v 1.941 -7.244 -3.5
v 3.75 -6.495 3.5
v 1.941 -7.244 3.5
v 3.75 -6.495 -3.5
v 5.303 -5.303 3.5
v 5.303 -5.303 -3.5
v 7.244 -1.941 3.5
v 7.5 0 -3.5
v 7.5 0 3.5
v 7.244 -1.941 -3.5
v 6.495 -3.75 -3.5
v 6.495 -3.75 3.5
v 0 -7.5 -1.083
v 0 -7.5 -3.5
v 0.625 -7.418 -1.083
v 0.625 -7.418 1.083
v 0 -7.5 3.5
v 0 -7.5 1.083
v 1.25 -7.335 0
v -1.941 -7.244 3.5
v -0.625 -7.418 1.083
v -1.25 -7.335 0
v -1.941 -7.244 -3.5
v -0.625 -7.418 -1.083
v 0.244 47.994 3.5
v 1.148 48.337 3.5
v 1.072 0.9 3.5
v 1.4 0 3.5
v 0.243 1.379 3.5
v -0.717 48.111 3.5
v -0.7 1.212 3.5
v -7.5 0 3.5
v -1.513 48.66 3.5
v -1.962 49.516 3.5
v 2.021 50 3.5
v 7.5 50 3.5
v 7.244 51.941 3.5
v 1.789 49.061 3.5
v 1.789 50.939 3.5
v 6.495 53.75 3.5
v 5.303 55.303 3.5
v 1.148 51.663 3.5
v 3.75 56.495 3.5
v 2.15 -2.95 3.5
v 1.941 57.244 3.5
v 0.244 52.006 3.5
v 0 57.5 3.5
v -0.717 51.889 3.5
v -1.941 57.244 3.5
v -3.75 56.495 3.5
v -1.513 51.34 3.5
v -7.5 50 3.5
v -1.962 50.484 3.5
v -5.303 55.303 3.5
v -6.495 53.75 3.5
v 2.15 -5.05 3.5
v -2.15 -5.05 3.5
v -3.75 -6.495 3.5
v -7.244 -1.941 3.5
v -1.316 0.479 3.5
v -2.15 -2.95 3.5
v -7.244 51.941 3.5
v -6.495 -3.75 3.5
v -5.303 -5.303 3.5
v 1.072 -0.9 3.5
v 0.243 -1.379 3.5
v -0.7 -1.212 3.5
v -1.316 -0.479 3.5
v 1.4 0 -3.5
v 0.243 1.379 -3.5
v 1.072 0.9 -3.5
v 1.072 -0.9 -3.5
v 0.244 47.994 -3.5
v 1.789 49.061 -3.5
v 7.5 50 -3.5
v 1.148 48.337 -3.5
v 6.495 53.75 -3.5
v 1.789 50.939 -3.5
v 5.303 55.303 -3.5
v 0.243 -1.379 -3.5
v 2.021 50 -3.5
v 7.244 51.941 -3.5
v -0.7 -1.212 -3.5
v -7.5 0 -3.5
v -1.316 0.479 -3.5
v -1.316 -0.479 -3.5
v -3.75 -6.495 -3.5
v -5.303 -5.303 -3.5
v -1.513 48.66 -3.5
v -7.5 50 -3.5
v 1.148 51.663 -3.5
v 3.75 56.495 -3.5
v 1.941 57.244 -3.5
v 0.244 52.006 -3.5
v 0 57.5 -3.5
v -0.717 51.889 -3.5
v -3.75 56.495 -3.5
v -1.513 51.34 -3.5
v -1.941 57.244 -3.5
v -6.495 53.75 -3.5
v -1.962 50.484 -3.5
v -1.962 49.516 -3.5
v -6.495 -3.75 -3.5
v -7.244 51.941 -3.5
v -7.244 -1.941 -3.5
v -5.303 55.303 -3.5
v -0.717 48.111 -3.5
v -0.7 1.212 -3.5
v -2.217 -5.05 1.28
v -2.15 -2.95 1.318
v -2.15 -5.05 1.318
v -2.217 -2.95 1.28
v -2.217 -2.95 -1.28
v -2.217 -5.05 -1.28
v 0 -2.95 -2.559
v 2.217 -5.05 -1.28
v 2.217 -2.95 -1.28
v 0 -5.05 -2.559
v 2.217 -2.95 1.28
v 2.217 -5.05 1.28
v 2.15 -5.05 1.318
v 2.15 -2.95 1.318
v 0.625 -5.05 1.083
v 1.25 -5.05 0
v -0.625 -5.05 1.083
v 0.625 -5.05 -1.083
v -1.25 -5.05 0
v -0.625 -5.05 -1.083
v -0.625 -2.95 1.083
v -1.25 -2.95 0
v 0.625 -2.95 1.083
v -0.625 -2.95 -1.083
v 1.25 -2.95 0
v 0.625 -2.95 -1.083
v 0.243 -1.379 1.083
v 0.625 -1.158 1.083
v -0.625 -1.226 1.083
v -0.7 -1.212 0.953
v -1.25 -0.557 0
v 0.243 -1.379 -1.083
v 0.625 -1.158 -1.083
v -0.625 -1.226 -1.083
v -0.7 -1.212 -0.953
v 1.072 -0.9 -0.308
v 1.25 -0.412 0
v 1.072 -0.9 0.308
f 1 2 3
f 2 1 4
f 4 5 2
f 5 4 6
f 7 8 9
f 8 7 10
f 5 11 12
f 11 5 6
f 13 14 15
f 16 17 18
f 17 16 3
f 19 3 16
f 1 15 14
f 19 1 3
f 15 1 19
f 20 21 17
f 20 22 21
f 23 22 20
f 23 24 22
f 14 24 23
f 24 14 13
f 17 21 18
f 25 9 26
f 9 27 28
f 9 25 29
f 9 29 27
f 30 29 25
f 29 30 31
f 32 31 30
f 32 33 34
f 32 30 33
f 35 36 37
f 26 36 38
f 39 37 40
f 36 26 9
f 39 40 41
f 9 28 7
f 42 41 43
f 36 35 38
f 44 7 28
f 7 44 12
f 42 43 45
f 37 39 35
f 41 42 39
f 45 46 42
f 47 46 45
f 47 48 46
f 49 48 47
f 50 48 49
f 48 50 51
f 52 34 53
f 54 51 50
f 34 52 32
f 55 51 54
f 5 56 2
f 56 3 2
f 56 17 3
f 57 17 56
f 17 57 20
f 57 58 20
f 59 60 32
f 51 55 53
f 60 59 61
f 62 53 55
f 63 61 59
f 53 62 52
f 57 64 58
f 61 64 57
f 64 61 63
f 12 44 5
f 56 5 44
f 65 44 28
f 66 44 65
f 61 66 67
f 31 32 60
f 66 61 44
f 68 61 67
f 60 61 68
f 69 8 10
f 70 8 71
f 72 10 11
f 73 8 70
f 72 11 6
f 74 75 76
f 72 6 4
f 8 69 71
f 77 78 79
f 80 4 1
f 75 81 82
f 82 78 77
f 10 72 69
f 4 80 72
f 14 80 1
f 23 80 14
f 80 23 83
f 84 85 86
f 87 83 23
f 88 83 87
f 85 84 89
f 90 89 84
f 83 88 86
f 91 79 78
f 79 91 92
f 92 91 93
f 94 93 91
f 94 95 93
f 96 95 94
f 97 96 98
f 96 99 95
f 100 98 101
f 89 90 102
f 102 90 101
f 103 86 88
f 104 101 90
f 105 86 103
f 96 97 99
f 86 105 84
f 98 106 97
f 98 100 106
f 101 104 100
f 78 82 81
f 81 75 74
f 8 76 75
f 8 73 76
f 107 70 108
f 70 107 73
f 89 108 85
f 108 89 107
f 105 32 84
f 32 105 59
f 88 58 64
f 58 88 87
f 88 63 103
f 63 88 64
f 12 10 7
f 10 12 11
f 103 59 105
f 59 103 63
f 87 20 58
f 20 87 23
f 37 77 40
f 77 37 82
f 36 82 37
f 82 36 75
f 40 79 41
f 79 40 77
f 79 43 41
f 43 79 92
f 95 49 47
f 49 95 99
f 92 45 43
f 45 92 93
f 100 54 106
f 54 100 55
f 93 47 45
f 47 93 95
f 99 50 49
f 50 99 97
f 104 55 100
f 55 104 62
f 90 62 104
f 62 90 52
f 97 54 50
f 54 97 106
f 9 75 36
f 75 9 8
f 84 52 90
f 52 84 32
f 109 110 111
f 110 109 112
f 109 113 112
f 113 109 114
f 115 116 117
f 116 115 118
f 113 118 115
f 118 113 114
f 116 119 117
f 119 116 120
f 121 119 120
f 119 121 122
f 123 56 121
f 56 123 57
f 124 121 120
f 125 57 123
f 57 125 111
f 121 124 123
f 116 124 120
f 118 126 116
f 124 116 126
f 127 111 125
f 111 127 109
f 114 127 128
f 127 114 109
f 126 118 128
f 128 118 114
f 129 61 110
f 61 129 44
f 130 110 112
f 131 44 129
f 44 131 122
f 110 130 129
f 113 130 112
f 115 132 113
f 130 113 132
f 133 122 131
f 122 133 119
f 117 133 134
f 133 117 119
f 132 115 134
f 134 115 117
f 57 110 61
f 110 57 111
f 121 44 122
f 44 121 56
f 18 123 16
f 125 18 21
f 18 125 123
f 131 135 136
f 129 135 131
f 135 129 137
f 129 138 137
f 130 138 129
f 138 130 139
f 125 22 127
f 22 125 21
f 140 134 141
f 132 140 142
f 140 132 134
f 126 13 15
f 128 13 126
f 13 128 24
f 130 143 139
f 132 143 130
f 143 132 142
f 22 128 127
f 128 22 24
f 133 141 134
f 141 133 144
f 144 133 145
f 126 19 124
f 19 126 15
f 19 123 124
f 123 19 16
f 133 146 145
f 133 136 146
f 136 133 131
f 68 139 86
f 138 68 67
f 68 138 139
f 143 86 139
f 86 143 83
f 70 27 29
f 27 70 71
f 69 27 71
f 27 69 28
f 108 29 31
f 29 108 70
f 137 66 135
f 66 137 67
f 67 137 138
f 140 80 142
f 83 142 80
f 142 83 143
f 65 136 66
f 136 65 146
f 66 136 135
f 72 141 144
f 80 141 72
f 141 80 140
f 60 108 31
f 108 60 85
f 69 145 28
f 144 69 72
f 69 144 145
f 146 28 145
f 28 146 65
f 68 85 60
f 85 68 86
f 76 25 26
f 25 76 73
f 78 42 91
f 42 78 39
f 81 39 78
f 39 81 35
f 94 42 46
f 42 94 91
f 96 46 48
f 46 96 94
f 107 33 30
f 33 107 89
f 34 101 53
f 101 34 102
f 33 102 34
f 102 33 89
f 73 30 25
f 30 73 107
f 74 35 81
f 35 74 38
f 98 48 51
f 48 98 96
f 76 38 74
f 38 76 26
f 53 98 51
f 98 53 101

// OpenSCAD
// file: common.scad
//include <RatsoShapeLibrary.scad>



/*
Define settings for each nut/bolt type here
*/

// ### layer height of the printer ###
printer_layer_height = 0.4;

// kludge factor for different print nozzles
printer_oversize = 0.5; // 0.35 nozzle use 0.3; 0.6 nozzle use 0.?
printer_oversizeArc = 0.2; // 0.35 nozzle = ???; 0.6 nozzle = 0.2


// ### M3 ###

M3_boltDiameter = 3.0 + printer_oversize; // actual 3.0
M3_boltDiameterArc = 3.0 + printer_oversizeArc; // used for rotary extruded bolt channel
M3_boltHeadDiameter = 6.0 + printer_oversize; // actual 6
M3_nutHeight = 2.4 + printer_oversize; // actual 2.4
M3_lockNutHeight = 4.0 + printer_oversize; // actual 4.0
M3_nutDiameterMin = 5.5 + printer_oversize; // actual 5.5
M3_nutDiameterMax = (5.5*(1/sin(60))) + printer_oversize; // actual 6
M3_nutDiameterArc = 5.5; // used for rotary extruded nut channel

// eventually standardize this interface??, that would allow for easy switching of bolt/nut sizes
M3_dim = [M3_boltDiameter,M3_nutDiameterMin,M3_nutDiameterMax,M3_nutHeight];


// ### M2 ###

M2_boltDiameter = 2.0 + printer_oversize; // actual 2.0
M2_boltHeadDiameter = 4.0 + printer_oversize; // actual 4
M2_nutHeight = 1.6 + printer_oversize; // actual 1.6
M2_nutDiameterMin = 3.8 + printer_oversize; // actual 4
M2_nutDiameterMax = (4.0*(1/sin(60))) + printer_oversize; // actual 4.5

// eventually standardize this interface??, that would allow for easy switching of bolt/nut sizes
M2_dim = [M2_boltDiameter,M2_nutDiameterMin,M2_nutDiameterMax,M2_nutHeight];

// ### M8 ###
M8_rodDiameter = 8 + printer_oversize;

// ### PI ###
pi = 3.14159265359;



// ### shaft sizes for tight fit ###
woodDowel_quarterInch_diameter = 7.1;
woodDowel_halfInch_diameter = 13.5;
stepperMotor_diameter = 5.0 + printer_oversize; // actual 5.0



//--------




// =========================================================

//trapNutDie(channelHeight=20, holeLength=50, holeOffset=15 );
//trapNutDie(channelHeight=0 ,holeLength=15, holeOffset=0, nutOffset=0 );
// ** this is a brand-new function
module trapNutDie(
	channelHeight=15, 
	holeLength=10, 
	holeOffset=0, 
	nutOffset=0, 
	boltHoleRes=12,
	boltRadius = M3_boltDiameter/2, // DEPRICATE
	mType = 0,
	boltDiameter = M3_boltDiameter,
	nutHeight = M3_nutHeight,
	nutDiameterMin = M3_nutDiameterMin,
	nutDiameterMax = M3_nutDiameterMax,
	horizontal = false // should add a support to the bolt hole, AND (###TODO###) make the nut height a little higher
	){

	if(!horizontal){
		// hex-hole for the nut
		translate([0,-(nutHeight/2),-nutOffset]) rotate([-90,30,0]) cylinder(r=nutDiameterMax/2, h=nutHeight, $fn=6);
		// channel the nut drops into
		translate([-nutDiameterMin/2,-(nutHeight/2),0]) cube([nutDiameterMin,nutHeight,channelHeight]);
	}else{
		// hex-hole for the nut
		translate([0,-(nutHeight/2),-nutOffset]) rotate([-90,30,0]) cylinder(r=nutDiameterMax/2, h=nutHeight+printer_layer_height, $fn=6);
		// channel the nut drops into
		translate([-nutDiameterMin/2,-(nutHeight/2),0]) cube([nutDiameterMin,nutHeight+printer_layer_height,channelHeight]);
	}

	difference(){
		// bolt hole
		translate([0,-(holeLength/2)+holeOffset,0]) rotate([-90,0,0]) cylinder(r=boltDiameter/2, h=holeLength, $fn=boltHoleRes);
		if(horizontal){
			// cutout slice for support (if horizontal)
			rotate([-90,0,0]) translate([0,0,(nutHeight/2)+0.001]) cylinder(r=(boltDiameter/2)+1, h=printer_layer_height*2);
		}
	}
	
}

// =================================

//stumpWithTrapNut(shaftDiameter=stepperMotor_diameter, stumpWallThick=6, nutBlockThick=12);
//stumpWithTrapNut(shaftDiameter=16 + printer_oversize ); // shaft collar for Chad's drum stand
//stumpWithTrapNut(shaftDiameter=woodDowel_halfInch_diameter, stumpWallThick=8, nutBlockThick=0);
//stumpWithTrapNut(shaftDiameter=woodDowel_quarterInch_diameter); // shaftDiameter was 7.3, but a little too loose


module stumpWithTrapNut(
	shaftDiameter = 7.3,
	stumpWallThick = 4,
	nutBlockThick = 8,
	){

	shaftRadius = shaftDiameter/2;
	stumpRadius = shaftRadius + stumpWallThick;
	stumpHeight = 10;

	nutBlockWidth = M3_nutDiameterMax+stumpWallThick;
	nutBlockOffsetY = stumpRadius + nutBlockThick - stumpWallThick;
	stumpTrapNutOffsetY = shaftRadius + ( max( stumpWallThick, nutBlockThick ) / 2.5 );  //nutBlockOffsetY - (nutBlockThick/2); //
	stumpTrapNutOffsetZ = stumpHeight/2;

	trapNutBoltHoleLength = max( nutBlockThick, stumpWallThick );

		// nut stump
			translate([0,0,0]) difference(){
				union(){
					// stump
					translate([0,0,0]) cylinder(r=stumpRadius, h=stumpHeight, center=false);
					// nut block
					translate([-nutBlockWidth/2,-nutBlockOffsetY,0]) cube([nutBlockWidth,nutBlockThick,stumpHeight]);
				}
				// motor shaft
				translate([0,0,(stumpHeight)/2]) cylinder(r=shaftRadius, h=stumpHeight+1, center=true, $fn=shaftDiameter*3);
				// trap nut
				rotate([0,0,0]) translate([0,-stumpTrapNutOffsetY, stumpHeight-stumpTrapNutOffsetZ]) rotate([0,0,0]) trapNutDie(channelHeight=10 ,holeLength=trapNutBoltHoleLength*2, holeOffset=(-trapNutBoltHoleLength)/2 ); //holeOffset=(length/2)+(r1/2)
			} // translate difference
}
// main file
include<common.scad>
include <RatsoShapeLibrary.scad>


// ========================================================

// Main function calls. Build things here.


// the basic body, for both types
//buzzBotBody();
//buzzBotBodyNoBattery();
//buzzBotBody_clipHackCover();

// parts for BuzzBot mini
// DELETE - buzzBotMiniLeg();
//simpleLeg( [5,50,3], 7); // default for BuzzBot mini
//simpleLeg( [8,100,8], 8); // default for BuzzBot big

// ** change these NOT just mini **
//buzzBotMiniWireBlockFoot();
//buzzBotMiniWireBlockFoot(wireType="bristle", buzzBotLegsThick = 8 );
//buzzBotMiniShaftWeight();

// parts for BuzzBot big
//buzzBotBigShaftWeight(length=50);
//buzzBotBigShaftWeight(length=100);
buzzBotBigShaftWeight(length=50);



// these simple elements are called by the other main types

//rotate([0,30,0]) trapNutDie(channelHeight=0 ,holeLength=20, holeOffset=0, nutOffset=0 );
//batteryHolderCase();
//simpleMotorCase();
//wireLockBlock();
//wireLockBlock(wireType="bristle");
//switchCase();


// connector for dowels
//rodClamp()


// ========================================================



// body wall thickness gets used in a bunch of calculations below
bodyWallThick = 1.5;
bodyFloorThick = bodyWallThick*2;

// -------------------------------------
// Battery settings

// these first three need to change depending on battery type
batteryDiameter = 15; // AAA:actual 10.5,use 11, AA: actual 14.5, use 15
batteryLength = 50.5; // AAA: actual 44.5, AA=50.5;  
batteryTerminalWidth = 11; // AAA=9, AA=11; width and height same

// this is for using one of the manufactured battery holders
batteryHolder_AA_1X = [ 17, 57 ];
batteryHolder_AA_2X = [ 31.9, 56.8 ];
batteryHolder_AA_4X = [ 63.5, 58 ];
batteryHolderSize = batteryHolder_AA_2X; // 1x=[ 17, 57 ], 2x=[ 31.9, 56.8 ], 4x=[ 63.5, 58 ]different than the 1x, why?

batteryHolderBoltInset_AA_1X = [ 2.5, 5 ];
batteryHolderBoltInset_AA_2X = [ 13.5, 5.5 ];
batteryHolderBoltInset_AA_4X = [ 3, 29 ];
batteryHolderBoltInset = batteryHolderBoltInset_AA_2X; // 1x=[2.5,5], 4x=[3,center]

batteryHolderWallHeight = 3;

// these stay the same 
batteryTerminalThick = 1.0; // was 1.6, thickness including bent tab, same for AAA/AA
batteryTerminalTabWidth = 3.5; // was 3.5
batteryTerminalTabThick = 1.5; // was 1.6
batteryTerminalTabRatio = 0.3; // where the triangle split occurs
batteryTerminalOpeningWidth = 9; // AAA  7; AA 9
batteryTerminalSlopeMaxWidth = (batteryTerminalWidth+batteryDiameter)/2; // max width of the area  where the terminals begin to slope

// calculate the size of the battery case
batteryCaseSizeOuter = [ 
	batteryHolderSize[0]+(bodyWallThick*2), 
	bodyWallThick+batteryHolderSize[1]+bodyWallThick, 
	batteryHolderWallHeight+bodyFloorThick
];
// the cutout for the battery
batteryCutoutSize = [ 
	batteryHolderSize[0], 
	batteryHolderSize[1], 
	batteryHolderWallHeight+1
];




// -------------------------------------
// Motor settings

// these change depending on the motor
motorBodyDiameter = 19.5; // pager: actual 7.0, use 6.9; hobby: actual 20, use ?
motorBodyLength = 20; // pager: 15 (long), 10 (short); hobby: 25, height 15
motorTopPadding = -5; // pager: 1; hobby: -6? - can be used to solve the non-round hobby motor issue (diameter != height)

// the bumps that help hold the motor in
motorHoldingRailsRadius = 3; // pager 2; hobby 3
motorHoldingRailsOffset = 1.5; // pager 1.5; hobby 2
motorHoldingRailsZoffset = 0.5;

// 
motorRearPadding = 10; 
motorRearNarrow = 10;
motorRearSideCut = 1;
motorSideWallThick = bodyWallThick * 2;
motorBottomWallThick = bodyFloorThick;

motorCaseSizeOuterNoHead = [ 
	(motorBodyDiameter)+(motorSideWallThick*2), 
	bodyWallThick+motorRearPadding+motorBodyLength, 
	(motorBodyDiameter+motorTopPadding)+(motorBottomWallThick*1)
];

motorCutoutSize = [ 
	motorBodyDiameter, 
	motorBodyLength+1, 
	motorBodyDiameter+motorTopPadding+1 
];


// -------------------------------------
// the switch

switchSize = [15,8,15];
switchScrewPlateWidth = 4;
switchScrewSpace = 19;
switchScrewDiameter = M2_boltDiameter;
switchScrewNutHeight = 4;
switchScrewNutZOffset = 5; // from top
switchScrewHoleDepth = 13; // from top
switchCaseSizeOuter = [ switchSize[0]+(bodyWallThick*2)+(switchScrewPlateWidth*2), switchSize[1], switchSize[2]+bodyFloorThick ];



// -------------------------------------
// the overall body
// 
buzzBotBodySizeOuter = [ 
	batteryCaseSizeOuter[0], 
	batteryCaseSizeOuter[1]+switchCaseSizeOuter[1]+motorCaseSizeOuterNoHead[1], 
	batteryCaseSizeOuter[2] 
];

//buzzBotMountSize = [ 10, 4, 30 ];
buzzBotMountTabHoleSpacing = 30;
buzzBotMountTabHolePadding = 5;
buzzBotMountTabSize = [ buzzBotMountTabHoleSpacing+(buzzBotMountTabHolePadding*2), (buzzBotMountTabHolePadding*2), 6 ];
buzzBotMountTabOffsetY = [0,0]; // [front,rear] from end
buzzBotMountTabMinSpacing = 35; // minimum distance between mounts (to allow room for rodClamp), TODO - should be distance between bolt holes



// -------------------------------------
// small, clip-on shaft weight for pager motor
// 
shaftWeightIR = 3.40; // motor diam is 7, was 3.53
shaftWeightTailLength = 10;
//
shaftWeightWallThick = 1.5;
//shaftWeightBaseThick = 0.0;
shaftWeightLength = 3; // the thickness of the weight
shaftWeightOR = shaftWeightIR + shaftWeightWallThick; // shaftWeightIR + shaftWeightWallThick;
shaftWeightCutOffset = 1.5; // from center
shaftWeightTailThick = 10;
shaftWeightTailRingIR = M3_boltDiameter; // for extra weight
shaftWeightRes = 45;
shaftWeightClipCut = 1;





// -------------------------------------
// other items


// "wire" here means wire leg
wireDiameter = 2.7;
wireLockBlockSize = [10,11,10];
wireLockBlockOffsetY = 27; // from center
wireLockBlockOffsetX = 10; // from edge
wireLockBlockNutOffsetZ = 0; // to center the nut over the bolt hole
wireBlockFootTabLength = buzzBotMountTabHoleSpacing + 15;
wireHoleOffsetY =8;
trapNutOffsetY = 3.5;
streetSweeperBristleSize = [4.0, 1.2]; // [width,thickness], actual [3.2,0.6]


// "wire" here means ground wire
groundWireRadius = 1.3;
groundWireHoleOffsetX = -1; // from center
groundWireHoleOffsetZ = -0.5;
groundWireBlockSize = [ 3.5, 3, 2.5 ];
groundWireBlockOffsets = [bodyWallThick+batteryTerminalThick,(batteryCaseSizeOuter[1])/2,batteryCaseSizeOuter[1]-groundWireBlockSize[1]-5];
groundWireChannelWidth = batteryTerminalThick; 
groundWireChannelHeight = 4;
hasGroundWireChannels = false;


//$fs=1;


// ========================================================






module buzzBotBigShaftWeight(
	shaftDiameter = 2.8, // actual 2
	width = 7.5,
	length = 20,
	height = 7,
	// use new M type framework in common
	trapNutOffset = 4,
	boltHeadHoleOffset = 3 // from trapNut
	){

	r1 = width;
	r2 = width;

	difference(){
		// main body
		translate([0,0,-(height/2)]) cam(r1,r2,length,height);
		// shaft hole
		cylinder(r=shaftDiameter/2,h=height+1,center=true, $fs=1);
		// trap nut 
		rotate([0,0,180]) translate([0,trapNutOffset,0]) trapNutDie(boltDiameter = M2_boltDiameter, nutHeight = M2_nutHeight, nutDiameterMin = M2_nutDiameterMin, nutDiameterMax = M2_nutDiameterMax, holeLength=length+(r1*2), holeOffset=(length/2)+(r1/2), boltHoleRes=6 );

		// recessed hole for bolt head
		//translate([0,trapNutOffset+boltHeadHoleOffset,0]) rotate([-90,0,0]) cylinder( r=(M2_boltHeadDiameter/2)*(1/sin(60)), h=length+width, center=false, $fn=6 );

		// hole for attaching more weight
		translate([0,length,0]) cylinder(r=(M3_boltDiameter/2)*(1/sin(60)),h=height+1, center=true, $fs=1);
	}
	
}


// -------------------------------------------------------------------------

//simpleMotorCase();

module simpleMotorCase(){
	difference(){
		union(){
			difference(){
			
				// outer cube
				cube(motorCaseSizeOuterNoHead);
				
				// cutout for motor
				translate([ 
					motorSideWallThick, 
					bodyWallThick, 
					motorBottomWallThick]) {

					//motorRearPadding
					translate([ (motorCutoutSize[0]-motorRearNarrow)/2, 0, 0 ]) trapazoid( motorRearNarrow, motorCutoutSize[0], motorRearPadding+0.001, motorCutoutSize[2] );
					// cutout for motor
					translate([ 0, motorRearPadding, 0 ]) cube(motorCutoutSize);

				} // translate
				
			} // difference
		
			// add bumps to keep the motor in place
			// bump
			translate([ motorSideWallThick, bodyWallThick+motorRearPadding, motorBottomWallThick+(motorCutoutSize[2]-1)-motorHoldingRailsRadius+motorHoldingRailsZoffset ]) difference(){
					translate([-motorHoldingRailsOffset,0,0]) rotate([ -90, 0, 0 ]) cylinder(r=motorHoldingRailsRadius, h=motorCutoutSize[1]-1);
					// cube to cutoff
					translate([ -0.001, -1, -motorHoldingRailsRadius ]) mirror([1,0,0]) cube([ motorHoldingRailsRadius*2, motorCutoutSize[1]+2, (motorHoldingRailsRadius*2)+2 ]);
			}// bump 
			translate([ motorSideWallThick+motorCutoutSize[0], bodyWallThick+motorRearPadding, motorBottomWallThick+(motorCutoutSize[2]-1)-motorHoldingRailsRadius+motorHoldingRailsZoffset ]) mirror([1,0,0]) difference(){
					translate([-motorHoldingRailsOffset,0,0]) rotate([ -90, 0, 0 ]) cylinder(r=motorHoldingRailsRadius, h=motorCutoutSize[1]-1);
					// cube to cutoff
					translate([ -0.001, -1, -motorHoldingRailsRadius ]) mirror([1,0,0]) cube([ motorHoldingRailsRadius*2, motorCutoutSize[1]+2, (motorHoldingRailsRadius*2)+2 ]);
			}
			
		}// union - for the bumps
		
		// cuts for allowing the sides to flex out
		translate([ -1, motorCaseSizeOuterNoHead[1]-motorBodyLength-0.001, motorBottomWallThick]) cube([motorCaseSizeOuterNoHead[0]+2, motorRearSideCut, motorCaseSizeOuterNoHead[2]+1 ]);

		//cutout between motor and positive terminal, motorRearNarrow
		translate([ (motorCaseSizeOuterNoHead[0]-motorRearNarrow)/2, -1, motorBottomWallThick ]) cube([ motorRearNarrow, (bodyWallThick*2)+0.002, motorCutoutSize[2]]);

	}// difference - for the rear side cutout

}

// -------------------------------------------------------------------------
//batteryHolderCase();
module batteryHolderCase(
	boltHoleDiameter = M2_boltDiameter
	){
	
	difference(){
		// outer cube
		//echo("batteryCaseSizeOuter",batteryCaseSizeOuter);
		cube(batteryCaseSizeOuter);
		// cutout for battery
		translate([bodyWallThick,bodyWallThick,bodyFloorThick+0.001]) cube(batteryCutoutSize);
		// bolt holes
		translate([ bodyWallThick+batteryHolderBoltInset[0], bodyWallThick+batteryHolderBoltInset[1], -1 ]) cylinder( r=boltHoleDiameter/2, h=bodyFloorThick+2, $fn=boltHoleDiameter*3 );
		translate([ batteryCaseSizeOuter[0]-bodyWallThick-batteryHolderBoltInset[0], batteryCaseSizeOuter[1]-bodyWallThick-batteryHolderBoltInset[1], -1 ]) cylinder( r=boltHoleDiameter/2, h=bodyFloorThick+2, $fn=boltHoleDiameter*3 );

	}
}


// -------------------------------------------------------------------------
// NOTE: I tried to define all the variables here as properties, but... then when I make the body, I need to know the size of the thing to use it in a model. So now I want to make all the variables globals at the top... but then I'm back to that system. hmmm.


module switchCase(
	//switchSize = [16,8,12], // z is from bottom of screw plate ('cause it hangs from that)
	screwPlateWidth = switchScrewPlateWidth, // the metal plate that hangs off the side for mounting
	screwDiameter = switchScrewDiameter,
	wallThick = bodyWallThick,
	floorThick = bodyFloorThick
	){

	caseSize = switchCaseSizeOuter;// [ switchSize[0]+(wallThick*2)+(screwPlateWidth*2), switchSize[1], switchSize[2]+floorThick ];
	custoutSize = [ switchSize[0], switchSize[1]+2, switchSize[2]+1 ];

	//
	difference(){
		// outer case
		cube(caseSize);
		// cutout for switch
		translate([screwPlateWidth+wallThick,-1,floorThick]) cube(custoutSize);

		// screw hole and nut
		translate([ (caseSize[0]/2)-(switchScrewSpace/2), caseSize[1]/2, caseSize[2]-switchScrewNutZOffset ]) cylinder(r=(M2_boltDiameter/2)*.8, h=switchScrewHoleDepth, $fn=M2_boltDiameter*4, center=true ); //rotate([90,0,90]) trapNutDie(channelHeight=caseSize[0]/2, holeLength=switchScrewHoleDepth+0.001, boltDiameter = M2_boltDiameter, nutHeight = M2_nutHeight, nutDiameterMin = M2_nutDiameterMin, nutDiameterMax = M2_nutDiameterMax, horizontal=true);

		translate([ (caseSize[0]/2)+(switchScrewSpace/2), caseSize[1]/2, caseSize[2]-switchScrewNutZOffset ]) cylinder(r=(M2_boltDiameter/2)*.8, h=switchScrewHoleDepth, $fn=M2_boltDiameter*4, center=true ); //rotate([90,0,-90]) trapNutDie(channelHeight=caseSize[0]/2, holeLength=switchScrewHoleDepth+0.001, boltDiameter = M2_boltDiameter, nutHeight = M2_nutHeight, nutDiameterMin = M2_nutDiameterMin, nutDiameterMax = M2_nutDiameterMax, horizontal=true);

	}		
}




// -------------------------------------------------------------------------

// BuzzBot

//buzzBotBody();

module buzzBotBody(){

	tabFrontOffsetX = max( buzzBotMountTabMinSpacing/2, motorCaseSizeOuterNoHead[0]/2 ); // tabFrontOffsetX || buzzBotMountTabMinSpacing
	tabRearOffsetX = max( buzzBotMountTabMinSpacing/2, buzzBotBodySizeOuter[0]/2 ); // tabFrontOffsetX || buzzBotMountTabMinSpacing

	tabFrontFillInBehindGap=tabFrontOffsetX-(motorCaseSizeOuterNoHead[0]/2)+0.001;
	tabRearFillInBehindGap=tabRearOffsetX-(buzzBotBodySizeOuter[0]/2)+0.001;

	difference(){
		union(){
			// battery holder
			batteryHolderCase();
			// switch
			translate([ (batteryCaseSizeOuter[0]-switchCaseSizeOuter[0])/2, batteryCaseSizeOuter[1], 0 ]) switchCase();
			// motor
			translate([ (batteryCaseSizeOuter[0]-motorCaseSizeOuterNoHead[0])/2, batteryCaseSizeOuter[1]+switchCaseSizeOuter[1],0]) simpleMotorCase();
			
				// mount tab left rear
				translate([ 
					(buzzBotBodySizeOuter[0]/2)-tabRearOffsetX-buzzBotMountTabSize[1]+0.001, 
					buzzBotMountTabSize[0]+buzzBotMountTabOffsetY[1],
					0]) rotate([0,0,-90]) buzzBotTabMount( fillInBehindGap=tabRearFillInBehindGap );
				
				// mount tab left front
				translate([
					(buzzBotBodySizeOuter[0]/2)-tabFrontOffsetX-buzzBotMountTabSize[1]+0.001, 
					buzzBotBodySizeOuter[1]-buzzBotMountTabOffsetY[0], 
					0]) rotate([0,0,-90]) buzzBotTabMount( fillInBehindGap=tabFrontFillInBehindGap );

				// mount tab right rear
				translate([ 
					(buzzBotBodySizeOuter[0]/2)+tabRearOffsetX+buzzBotMountTabSize[1]-0.001,
					buzzBotMountTabSize[0]+buzzBotMountTabOffsetY[1],
					0]) rotate([0,0,-90]) mirror([0,1,0]) buzzBotTabMount( fillInBehindGap=tabRearFillInBehindGap );

				// mount tab right front
				translate([
					(buzzBotBodySizeOuter[0]/2)+tabFrontOffsetX+buzzBotMountTabSize[1]-0.001, 
					buzzBotBodySizeOuter[1]-buzzBotMountTabOffsetY[0], 
					0]) rotate([0,0,-90]) mirror([0,1,0]) buzzBotTabMount( fillInBehindGap=tabFrontFillInBehindGap );

				// tail
				translate([(batteryCaseSizeOuter[0]-buzzBotMountTabSize[0])/2,-buzzBotMountTabSize[1]+0.001,0]) rotate([0,0,0]) buzzBotTabMount();
			
		} // union
	

	} // difference
}

// -------------------------------------------------------------------------

//buzzBotBodyNoBattery();

module buzzBotBodyNoBattery(){

	tabFrontOffsetX = max( buzzBotMountTabMinSpacing/2, motorCaseSizeOuterNoHead[0]/2 ); // tabFrontOffsetX || buzzBotMountTabMinSpacing
	tabRearOffsetX = max( buzzBotMountTabMinSpacing/2, buzzBotBodySizeOuter[0]/2 ); // tabFrontOffsetX || buzzBotMountTabMinSpacing

	tabFrontFillInBehindGap=tabFrontOffsetX-(motorCaseSizeOuterNoHead[0]/2)+0.001;
	tabRearFillInBehindGap=tabRearOffsetX-(buzzBotBodySizeOuter[0]/2)+0.001;

	tailTabSpacing = buzzBotMountTabMinSpacing/2;

	difference(){
		union(){
			// battery holder
			//batteryHolderCase();
			// switch
			translate([ (batteryCaseSizeOuter[0]-switchCaseSizeOuter[0])/2, tailTabSpacing, 0 ]) switchCase();
			// motor
			translate([ (batteryCaseSizeOuter[0]-motorCaseSizeOuterNoHead[0])/2, tailTabSpacing+switchCaseSizeOuter[1],0]) simpleMotorCase();
			
				
				// mount tab left front
				translate([
					(buzzBotBodySizeOuter[0]/2)-tabFrontOffsetX-buzzBotMountTabSize[1]+0.001, 
					tailTabSpacing, 
					0]) rotate([0,0,-90]) mirror([1,0,0]) buzzBotTabMount( fillInBehindGap=tabFrontFillInBehindGap );


				// mount tab right front
				translate([
					(buzzBotBodySizeOuter[0]/2)+tabFrontOffsetX+buzzBotMountTabSize[1]-0.001, 
					tailTabSpacing, 
					0]) rotate([0,0,90]) mirror([0,0,0]) buzzBotTabMount( fillInBehindGap=tabFrontFillInBehindGap );

				// tail
				translate([(batteryCaseSizeOuter[0]-buzzBotMountTabSize[0])/2,-buzzBotMountTabSize[1]+0.001,0]) rotate([0,0,0]) buzzBotTabMount( fillInBehindGap=tailTabSpacing);
			
		} // union
	


		//translate([clipHackCaseTranslateTo[0],clipHackCaseTranslateTo[1]-0.001,clipHackCaseTranslateTo[2]-1])roundRectangle([clipHack_outerWidth,clipHack_outerDepth,buzzBotMountTabSize[2]+2], caseCornerRounding );
		//
		translate([(batteryCaseSizeOuter[0]/2),clipHack_boltOffset,-1]) cylinder(r=clipHack_boltCutoutDiameter/2, h=buzzBotMountTabSize[2]+2);

	} // difference

	//
		// the rca jack 
		translate(clipHackCaseTranslateTo) difference() {
			scale(1) import("peripherals v2 - clipHack - case.stl");
		// cutoff back
		translate([-1,clipHack_chopOffset,0]) cube([clipHack_outerWidth+2,clipHack_outerDepth,clipHack_outerHeight]);
	}

}

clipHack_outerWidth = 14;
clipHack_outerDepth = 21;
clipHack_outerHeight = 15;
clipHack_chopOffset = 22;
clipHack_boltOffset = 6.5;
clipHack_boltCutoutDiameter = M3_nutDiameterMax+2;
caseCornerRounding = 3;
clipHackCaseTranslateTo = [(batteryCaseSizeOuter[0]/2)-(clipHack_outerWidth/2), -(buzzBotMountTabSize[1]), buzzBotMountTabSize[2]-0.001]; // caution: clipHack cannot go so low as to raise the floor (else the RCA jack won't fit)



module buzzBotBody_clipHackCover(){
	difference(){
		scale(1) import("peripherals v2 - clipHack - cover.stl");
		translate([-1,clipHack_chopOffset,-1]) cube([clipHack_outerWidth+2,clipHack_outerDepth,clipHack_outerHeight]);
	}
}



// -------------------------------------------------------------------------


module buzzBotTabMount( 
	fillInBehindGap=0
	){
	//
	//buzzBotMountTabSize
	translate([ 0, 0, 0 ]) {
		difference(){
			// tab body
			rotate([0,0,0]) cube( [buzzBotMountTabSize[0],buzzBotMountTabSize[1]+fillInBehindGap,buzzBotMountTabSize[2]] );
			// hole
			translate([ (buzzBotMountTabSize[1]/2), (buzzBotMountTabSize[1]/2), buzzBotMountTabSize[2] ]) rotate([ 90,0,0 ]) rotate([0,30,0]) trapNutDie(channelHeight=0 ,holeLength=15, holeOffset=0, nutOffset=0, nutHeight=buzzBotMountTabSize[2] );
			translate([ (buzzBotMountTabSize[0])-(buzzBotMountTabSize[1]/2), (buzzBotMountTabSize[1]/2), buzzBotMountTabSize[2] ]) rotate([ 90,0,0 ]) rotate([0,30,0]) trapNutDie(channelHeight=0 ,holeLength=15, holeOffset=0, nutOffset=0, nutHeight=buzzBotMountTabSize[2] );
		}
		// add filler behind, for the motor case section (because it is more narrow)
		//translate([ 0, -(batteryCaseSizeOuter[0]-motorCaseSizeOuterNoHead[0])/2, 0 ]) cube([buzzBotMountTabSize[0], fillInBehindGap,buzzBotMountTabSize[2]]);
	}

}

// -------------------------------------------------------------------------



module simpleLeg(
	size = [5,50,3], // outer size: X,Y,Z 
	endRadius = 7 // the round end of the leg, only used if size[0] < endRadius
	){
	
	difference(){
		union(){	
			// the body 
			translate([0,0,0]) cam( size[0]/2, size[0]/2, size[1], size[2] );
			// the ends
			cylinder(r=endRadius, h=size[2]);
			translate([0,size[1],0]) cylinder(r=endRadius, h=size[2]);
		}// union
		// trap nut close end
		translate([0,0,size[2]])  rotate([90,0,0]) trapNutDie(channelHeight=0 ,holeLength=size[2]*2, holeOffset=0, nutOffset=0, nutHeight=size[2] );
		// trap nut far end
		translate([0,size[1],size[2]])  rotate([90,0,0]) trapNutDie(channelHeight=0 ,holeLength=size[2]*2, holeOffset=0, nutOffset=0, nutHeight=size[2] );
	}

}

// -------------------------------------------------------------------------








// -------------------------------------------------------------------------

module buzzBotMiniShaftWeight(){
	$fn=shaftWeightRes;
	union(){
		difference(){
			union(){
				// outer cylinder
				cylinder( r=shaftWeightOR, h=shaftWeightLength );
				// add weight/fin/whatever you call it
				 translate([ 0, -shaftWeightIR-shaftWeightTailLength+shaftWeightTailThick/2, 0 ]) cam( shaftWeightTailThick/2, shaftWeightOR, shaftWeightTailLength, shaftWeightLength ); 
			}// union
			// cutoff flat side of outer
			translate([-shaftWeightOR-1,shaftWeightCutOffset+shaftWeightWallThick,-1]) cube([(shaftWeightOR*2)+2,shaftWeightOR,shaftWeightLength+shaftWeightWallThick+2]);
			translate([0,0,-1]) difference() {
				// inner cylinder
				cylinder( r=shaftWeightIR, h=shaftWeightLength+2 );
				// cutoff flat side of inner
				translate([-shaftWeightIR*2,shaftWeightCutOffset,-1]) cube([(shaftWeightIR*4),shaftWeightIR,shaftWeightLength+4]);
			}
			// cutout to make it a clip
			translate([0,shaftWeightCutOffset-shaftWeightClipCut,-1]) cube([ shaftWeightOR+1, shaftWeightClipCut, shaftWeightLength+2 ]);

			if(shaftWeightTailRingIR>0){
			// hole
				translate([ 0, -shaftWeightTailLength+shaftWeightTailRingIR, -1 ]) cylinder( r=shaftWeightTailRingIR, h=shaftWeightLength+2 );
			}
		}// difference
	
	/*
	if(shaftWeightTailRingIR>0){
	// add hole
	translate([ 0, -shaftWeightTailLength, -1 ]) cylinder( r=shaftWeightTailRingIR, h=shaftWeightLength+2 );
	translate([ 0, -shaftWeightOR-shaftWeightTailLength-shaftWeightTailRingIR-(shaftWeightWallThick/2), 0 ]) difference(){
		// outer
		cylinder( r=shaftWeightTailRingIR+shaftWeightWallThick, h=shaftWeightLength );
		// inner
		translate([ 0, 0, -1 ]) cylinder( r=shaftWeightTailRingIR, h=shaftWeightLength+2 );
	}
	}// if
	*/
	}//union


}

// -------------------------------------------------------------------------





// -------------------------------------------------------


module groundWireBlock(offsetY){
	translate([0,offsetY,0]) difference(){
		union(){
			cube(groundWireBlockSize);
			// support, rightTriangle(size[x,y,z])
			translate([0,0,0]) rotate([-90,0,0]) rightTriangle([ groundWireBlockSize[0], groundWireBlockSize[0], groundWireBlockSize[1] ]);
		}
			// hole for wire
			translate([(groundWireBlockSize[0]/2)+groundWireHoleOffsetX,-1, (groundWireBlockSize[2]/2)+groundWireHoleOffsetZ ]) rotate([-90,0,0]) cylinder(r=groundWireRadius, h=groundWireBlockSize[1]+2, $fn=6);
	}
}


// -------------------------------------------------------

//buzzBotBigWireBlockFoot();

module buzzBotBigWireBlockFoot(
	wireType="bristle",
	buzzBotLegsThick = 4,
	mountBoltSpacing = 25, // make match the rod clamp
	mountTabLength = 40
	){
	
	mountTabCenter = wireLockBlockSize[1] + (mountTabLength/2);

	difference(){
		union(){
			// mount tab
			translate([-(wireLockBlockSize[0]/2),wireLockBlockSize[1]-0.001,0]) cube([wireLockBlockSize[0],mountTabLength+0.001,buzzBotLegsThick]);
			//  block
			translate([-(wireLockBlockSize[0]/2),0,0]) mirror([0,0,0]) wireLockBlock(wireType=wireType);
		} // union
		
		// trap nut
		translate([ 0, mountTabCenter-(mountBoltSpacing/2),buzzBotLegsThick-(M3_nutHeight/3)+0.001 ]) rotate([ 90,0,0 ]) rotate([0,0,0]) trapNutDie(channelHeight=0 ,holeLength=15, holeOffset=0, nutOffset=0 );
		translate([ 0, mountTabCenter+(mountBoltSpacing/2),buzzBotLegsThick-(M3_nutHeight/3)+0.001 ]) rotate([ 90,0,0 ]) rotate([0,0,0]) trapNutDie(channelHeight=0 ,holeLength=15, holeOffset=0, nutOffset=0 );

	} // difference
}


// -------------------------------------------------------


module buzzBotMiniWireBlockFoot(
	wireType="wire",
	buzzBotLegsThick = 6
	){
	difference(){
		union(){
			// cube leading up to block
			translate([-(wireLockBlockSize[0]/2),0,0]) cube([wireLockBlockSize[0],wireBlockFootTabLength+0.001,buzzBotLegsThick]);
			//  block
			translate([-(wireLockBlockSize[0]/2),wireLockBlockSize[1]+wireBlockFootTabLength,0]) mirror([0,1,0]) wireLockBlock(wireType=wireType);
		} // union
		
		// trap nut
		translate([ 0, (wireBlockFootTabLength/2)-(buzzBotMountTabHoleSpacing/2),buzzBotLegsThick-(M2_nutHeight/2)+0.001 ]) rotate([ 90,0,0 ]) rotate([0,0,0]) trapNutDie(channelHeight=0 ,holeLength=15, holeOffset=0, nutOffset=0 );
		translate([ 0, (wireBlockFootTabLength/2)+(buzzBotMountTabHoleSpacing/2),buzzBotLegsThick-(M2_nutHeight/2)+0.001 ]) rotate([ 90,0,0 ]) rotate([0,0,0]) trapNutDie(channelHeight=0 ,holeLength=15, holeOffset=0, nutOffset=0 );

	} // difference
}

// wireBlockFootTabLength, buzzBotMountTabHoleSpacing

// -------------------------------------------------------------------------
module wireLockBlock( 
	wireRad=wireDiameter/2, 
	boltRad=boltDiameter/2,
	wireType = "wire",
	bristleSize= streetSweeperBristleSize
	){

	bristleHoleSize = [ bristleSize[0], bristleSize[1], wireLockBlockSize[2]+1 ];

	difference(){
		cube(wireLockBlockSize);
		// wire hole vert
		translate([ wireLockBlockSize[0]/2, wireHoleOffsetY, wireLockBlockSize[2]/2 ])  rotate([0,0,0]) {
			if(wireType=="bristle"){
				cube(bristleHoleSize, center=true);
			}else{
				cylinder(r=wireRad, h=wireLockBlockSize[2]+2, center=true,$fn=6);
			}
		}
		// wire hole horz
		translate([wireLockBlockSize[0]/2, wireHoleOffsetY, wireLockBlockSize[2]/2 ]) rotate([0,90,0]) {
			if(wireType=="bristle"){
				cube(bristleHoleSize, center=true);
			}else{
				rotate([0,0,30]) cylinder(r=wireRad, h=wireLockBlockSize[2]+2, center=true,$fn=6);
			}
		}
		// trap nut
		translate([ wireLockBlockSize[0]/2, trapNutOffsetY, wireLockBlockSize[2]/2 ]) trapNutDie(channelHeight=wireLockBlockSize[2], holeOffset=-1, holeLength=11, nutOffset=wireLockBlockNutOffsetZ);
	} // difference

}
